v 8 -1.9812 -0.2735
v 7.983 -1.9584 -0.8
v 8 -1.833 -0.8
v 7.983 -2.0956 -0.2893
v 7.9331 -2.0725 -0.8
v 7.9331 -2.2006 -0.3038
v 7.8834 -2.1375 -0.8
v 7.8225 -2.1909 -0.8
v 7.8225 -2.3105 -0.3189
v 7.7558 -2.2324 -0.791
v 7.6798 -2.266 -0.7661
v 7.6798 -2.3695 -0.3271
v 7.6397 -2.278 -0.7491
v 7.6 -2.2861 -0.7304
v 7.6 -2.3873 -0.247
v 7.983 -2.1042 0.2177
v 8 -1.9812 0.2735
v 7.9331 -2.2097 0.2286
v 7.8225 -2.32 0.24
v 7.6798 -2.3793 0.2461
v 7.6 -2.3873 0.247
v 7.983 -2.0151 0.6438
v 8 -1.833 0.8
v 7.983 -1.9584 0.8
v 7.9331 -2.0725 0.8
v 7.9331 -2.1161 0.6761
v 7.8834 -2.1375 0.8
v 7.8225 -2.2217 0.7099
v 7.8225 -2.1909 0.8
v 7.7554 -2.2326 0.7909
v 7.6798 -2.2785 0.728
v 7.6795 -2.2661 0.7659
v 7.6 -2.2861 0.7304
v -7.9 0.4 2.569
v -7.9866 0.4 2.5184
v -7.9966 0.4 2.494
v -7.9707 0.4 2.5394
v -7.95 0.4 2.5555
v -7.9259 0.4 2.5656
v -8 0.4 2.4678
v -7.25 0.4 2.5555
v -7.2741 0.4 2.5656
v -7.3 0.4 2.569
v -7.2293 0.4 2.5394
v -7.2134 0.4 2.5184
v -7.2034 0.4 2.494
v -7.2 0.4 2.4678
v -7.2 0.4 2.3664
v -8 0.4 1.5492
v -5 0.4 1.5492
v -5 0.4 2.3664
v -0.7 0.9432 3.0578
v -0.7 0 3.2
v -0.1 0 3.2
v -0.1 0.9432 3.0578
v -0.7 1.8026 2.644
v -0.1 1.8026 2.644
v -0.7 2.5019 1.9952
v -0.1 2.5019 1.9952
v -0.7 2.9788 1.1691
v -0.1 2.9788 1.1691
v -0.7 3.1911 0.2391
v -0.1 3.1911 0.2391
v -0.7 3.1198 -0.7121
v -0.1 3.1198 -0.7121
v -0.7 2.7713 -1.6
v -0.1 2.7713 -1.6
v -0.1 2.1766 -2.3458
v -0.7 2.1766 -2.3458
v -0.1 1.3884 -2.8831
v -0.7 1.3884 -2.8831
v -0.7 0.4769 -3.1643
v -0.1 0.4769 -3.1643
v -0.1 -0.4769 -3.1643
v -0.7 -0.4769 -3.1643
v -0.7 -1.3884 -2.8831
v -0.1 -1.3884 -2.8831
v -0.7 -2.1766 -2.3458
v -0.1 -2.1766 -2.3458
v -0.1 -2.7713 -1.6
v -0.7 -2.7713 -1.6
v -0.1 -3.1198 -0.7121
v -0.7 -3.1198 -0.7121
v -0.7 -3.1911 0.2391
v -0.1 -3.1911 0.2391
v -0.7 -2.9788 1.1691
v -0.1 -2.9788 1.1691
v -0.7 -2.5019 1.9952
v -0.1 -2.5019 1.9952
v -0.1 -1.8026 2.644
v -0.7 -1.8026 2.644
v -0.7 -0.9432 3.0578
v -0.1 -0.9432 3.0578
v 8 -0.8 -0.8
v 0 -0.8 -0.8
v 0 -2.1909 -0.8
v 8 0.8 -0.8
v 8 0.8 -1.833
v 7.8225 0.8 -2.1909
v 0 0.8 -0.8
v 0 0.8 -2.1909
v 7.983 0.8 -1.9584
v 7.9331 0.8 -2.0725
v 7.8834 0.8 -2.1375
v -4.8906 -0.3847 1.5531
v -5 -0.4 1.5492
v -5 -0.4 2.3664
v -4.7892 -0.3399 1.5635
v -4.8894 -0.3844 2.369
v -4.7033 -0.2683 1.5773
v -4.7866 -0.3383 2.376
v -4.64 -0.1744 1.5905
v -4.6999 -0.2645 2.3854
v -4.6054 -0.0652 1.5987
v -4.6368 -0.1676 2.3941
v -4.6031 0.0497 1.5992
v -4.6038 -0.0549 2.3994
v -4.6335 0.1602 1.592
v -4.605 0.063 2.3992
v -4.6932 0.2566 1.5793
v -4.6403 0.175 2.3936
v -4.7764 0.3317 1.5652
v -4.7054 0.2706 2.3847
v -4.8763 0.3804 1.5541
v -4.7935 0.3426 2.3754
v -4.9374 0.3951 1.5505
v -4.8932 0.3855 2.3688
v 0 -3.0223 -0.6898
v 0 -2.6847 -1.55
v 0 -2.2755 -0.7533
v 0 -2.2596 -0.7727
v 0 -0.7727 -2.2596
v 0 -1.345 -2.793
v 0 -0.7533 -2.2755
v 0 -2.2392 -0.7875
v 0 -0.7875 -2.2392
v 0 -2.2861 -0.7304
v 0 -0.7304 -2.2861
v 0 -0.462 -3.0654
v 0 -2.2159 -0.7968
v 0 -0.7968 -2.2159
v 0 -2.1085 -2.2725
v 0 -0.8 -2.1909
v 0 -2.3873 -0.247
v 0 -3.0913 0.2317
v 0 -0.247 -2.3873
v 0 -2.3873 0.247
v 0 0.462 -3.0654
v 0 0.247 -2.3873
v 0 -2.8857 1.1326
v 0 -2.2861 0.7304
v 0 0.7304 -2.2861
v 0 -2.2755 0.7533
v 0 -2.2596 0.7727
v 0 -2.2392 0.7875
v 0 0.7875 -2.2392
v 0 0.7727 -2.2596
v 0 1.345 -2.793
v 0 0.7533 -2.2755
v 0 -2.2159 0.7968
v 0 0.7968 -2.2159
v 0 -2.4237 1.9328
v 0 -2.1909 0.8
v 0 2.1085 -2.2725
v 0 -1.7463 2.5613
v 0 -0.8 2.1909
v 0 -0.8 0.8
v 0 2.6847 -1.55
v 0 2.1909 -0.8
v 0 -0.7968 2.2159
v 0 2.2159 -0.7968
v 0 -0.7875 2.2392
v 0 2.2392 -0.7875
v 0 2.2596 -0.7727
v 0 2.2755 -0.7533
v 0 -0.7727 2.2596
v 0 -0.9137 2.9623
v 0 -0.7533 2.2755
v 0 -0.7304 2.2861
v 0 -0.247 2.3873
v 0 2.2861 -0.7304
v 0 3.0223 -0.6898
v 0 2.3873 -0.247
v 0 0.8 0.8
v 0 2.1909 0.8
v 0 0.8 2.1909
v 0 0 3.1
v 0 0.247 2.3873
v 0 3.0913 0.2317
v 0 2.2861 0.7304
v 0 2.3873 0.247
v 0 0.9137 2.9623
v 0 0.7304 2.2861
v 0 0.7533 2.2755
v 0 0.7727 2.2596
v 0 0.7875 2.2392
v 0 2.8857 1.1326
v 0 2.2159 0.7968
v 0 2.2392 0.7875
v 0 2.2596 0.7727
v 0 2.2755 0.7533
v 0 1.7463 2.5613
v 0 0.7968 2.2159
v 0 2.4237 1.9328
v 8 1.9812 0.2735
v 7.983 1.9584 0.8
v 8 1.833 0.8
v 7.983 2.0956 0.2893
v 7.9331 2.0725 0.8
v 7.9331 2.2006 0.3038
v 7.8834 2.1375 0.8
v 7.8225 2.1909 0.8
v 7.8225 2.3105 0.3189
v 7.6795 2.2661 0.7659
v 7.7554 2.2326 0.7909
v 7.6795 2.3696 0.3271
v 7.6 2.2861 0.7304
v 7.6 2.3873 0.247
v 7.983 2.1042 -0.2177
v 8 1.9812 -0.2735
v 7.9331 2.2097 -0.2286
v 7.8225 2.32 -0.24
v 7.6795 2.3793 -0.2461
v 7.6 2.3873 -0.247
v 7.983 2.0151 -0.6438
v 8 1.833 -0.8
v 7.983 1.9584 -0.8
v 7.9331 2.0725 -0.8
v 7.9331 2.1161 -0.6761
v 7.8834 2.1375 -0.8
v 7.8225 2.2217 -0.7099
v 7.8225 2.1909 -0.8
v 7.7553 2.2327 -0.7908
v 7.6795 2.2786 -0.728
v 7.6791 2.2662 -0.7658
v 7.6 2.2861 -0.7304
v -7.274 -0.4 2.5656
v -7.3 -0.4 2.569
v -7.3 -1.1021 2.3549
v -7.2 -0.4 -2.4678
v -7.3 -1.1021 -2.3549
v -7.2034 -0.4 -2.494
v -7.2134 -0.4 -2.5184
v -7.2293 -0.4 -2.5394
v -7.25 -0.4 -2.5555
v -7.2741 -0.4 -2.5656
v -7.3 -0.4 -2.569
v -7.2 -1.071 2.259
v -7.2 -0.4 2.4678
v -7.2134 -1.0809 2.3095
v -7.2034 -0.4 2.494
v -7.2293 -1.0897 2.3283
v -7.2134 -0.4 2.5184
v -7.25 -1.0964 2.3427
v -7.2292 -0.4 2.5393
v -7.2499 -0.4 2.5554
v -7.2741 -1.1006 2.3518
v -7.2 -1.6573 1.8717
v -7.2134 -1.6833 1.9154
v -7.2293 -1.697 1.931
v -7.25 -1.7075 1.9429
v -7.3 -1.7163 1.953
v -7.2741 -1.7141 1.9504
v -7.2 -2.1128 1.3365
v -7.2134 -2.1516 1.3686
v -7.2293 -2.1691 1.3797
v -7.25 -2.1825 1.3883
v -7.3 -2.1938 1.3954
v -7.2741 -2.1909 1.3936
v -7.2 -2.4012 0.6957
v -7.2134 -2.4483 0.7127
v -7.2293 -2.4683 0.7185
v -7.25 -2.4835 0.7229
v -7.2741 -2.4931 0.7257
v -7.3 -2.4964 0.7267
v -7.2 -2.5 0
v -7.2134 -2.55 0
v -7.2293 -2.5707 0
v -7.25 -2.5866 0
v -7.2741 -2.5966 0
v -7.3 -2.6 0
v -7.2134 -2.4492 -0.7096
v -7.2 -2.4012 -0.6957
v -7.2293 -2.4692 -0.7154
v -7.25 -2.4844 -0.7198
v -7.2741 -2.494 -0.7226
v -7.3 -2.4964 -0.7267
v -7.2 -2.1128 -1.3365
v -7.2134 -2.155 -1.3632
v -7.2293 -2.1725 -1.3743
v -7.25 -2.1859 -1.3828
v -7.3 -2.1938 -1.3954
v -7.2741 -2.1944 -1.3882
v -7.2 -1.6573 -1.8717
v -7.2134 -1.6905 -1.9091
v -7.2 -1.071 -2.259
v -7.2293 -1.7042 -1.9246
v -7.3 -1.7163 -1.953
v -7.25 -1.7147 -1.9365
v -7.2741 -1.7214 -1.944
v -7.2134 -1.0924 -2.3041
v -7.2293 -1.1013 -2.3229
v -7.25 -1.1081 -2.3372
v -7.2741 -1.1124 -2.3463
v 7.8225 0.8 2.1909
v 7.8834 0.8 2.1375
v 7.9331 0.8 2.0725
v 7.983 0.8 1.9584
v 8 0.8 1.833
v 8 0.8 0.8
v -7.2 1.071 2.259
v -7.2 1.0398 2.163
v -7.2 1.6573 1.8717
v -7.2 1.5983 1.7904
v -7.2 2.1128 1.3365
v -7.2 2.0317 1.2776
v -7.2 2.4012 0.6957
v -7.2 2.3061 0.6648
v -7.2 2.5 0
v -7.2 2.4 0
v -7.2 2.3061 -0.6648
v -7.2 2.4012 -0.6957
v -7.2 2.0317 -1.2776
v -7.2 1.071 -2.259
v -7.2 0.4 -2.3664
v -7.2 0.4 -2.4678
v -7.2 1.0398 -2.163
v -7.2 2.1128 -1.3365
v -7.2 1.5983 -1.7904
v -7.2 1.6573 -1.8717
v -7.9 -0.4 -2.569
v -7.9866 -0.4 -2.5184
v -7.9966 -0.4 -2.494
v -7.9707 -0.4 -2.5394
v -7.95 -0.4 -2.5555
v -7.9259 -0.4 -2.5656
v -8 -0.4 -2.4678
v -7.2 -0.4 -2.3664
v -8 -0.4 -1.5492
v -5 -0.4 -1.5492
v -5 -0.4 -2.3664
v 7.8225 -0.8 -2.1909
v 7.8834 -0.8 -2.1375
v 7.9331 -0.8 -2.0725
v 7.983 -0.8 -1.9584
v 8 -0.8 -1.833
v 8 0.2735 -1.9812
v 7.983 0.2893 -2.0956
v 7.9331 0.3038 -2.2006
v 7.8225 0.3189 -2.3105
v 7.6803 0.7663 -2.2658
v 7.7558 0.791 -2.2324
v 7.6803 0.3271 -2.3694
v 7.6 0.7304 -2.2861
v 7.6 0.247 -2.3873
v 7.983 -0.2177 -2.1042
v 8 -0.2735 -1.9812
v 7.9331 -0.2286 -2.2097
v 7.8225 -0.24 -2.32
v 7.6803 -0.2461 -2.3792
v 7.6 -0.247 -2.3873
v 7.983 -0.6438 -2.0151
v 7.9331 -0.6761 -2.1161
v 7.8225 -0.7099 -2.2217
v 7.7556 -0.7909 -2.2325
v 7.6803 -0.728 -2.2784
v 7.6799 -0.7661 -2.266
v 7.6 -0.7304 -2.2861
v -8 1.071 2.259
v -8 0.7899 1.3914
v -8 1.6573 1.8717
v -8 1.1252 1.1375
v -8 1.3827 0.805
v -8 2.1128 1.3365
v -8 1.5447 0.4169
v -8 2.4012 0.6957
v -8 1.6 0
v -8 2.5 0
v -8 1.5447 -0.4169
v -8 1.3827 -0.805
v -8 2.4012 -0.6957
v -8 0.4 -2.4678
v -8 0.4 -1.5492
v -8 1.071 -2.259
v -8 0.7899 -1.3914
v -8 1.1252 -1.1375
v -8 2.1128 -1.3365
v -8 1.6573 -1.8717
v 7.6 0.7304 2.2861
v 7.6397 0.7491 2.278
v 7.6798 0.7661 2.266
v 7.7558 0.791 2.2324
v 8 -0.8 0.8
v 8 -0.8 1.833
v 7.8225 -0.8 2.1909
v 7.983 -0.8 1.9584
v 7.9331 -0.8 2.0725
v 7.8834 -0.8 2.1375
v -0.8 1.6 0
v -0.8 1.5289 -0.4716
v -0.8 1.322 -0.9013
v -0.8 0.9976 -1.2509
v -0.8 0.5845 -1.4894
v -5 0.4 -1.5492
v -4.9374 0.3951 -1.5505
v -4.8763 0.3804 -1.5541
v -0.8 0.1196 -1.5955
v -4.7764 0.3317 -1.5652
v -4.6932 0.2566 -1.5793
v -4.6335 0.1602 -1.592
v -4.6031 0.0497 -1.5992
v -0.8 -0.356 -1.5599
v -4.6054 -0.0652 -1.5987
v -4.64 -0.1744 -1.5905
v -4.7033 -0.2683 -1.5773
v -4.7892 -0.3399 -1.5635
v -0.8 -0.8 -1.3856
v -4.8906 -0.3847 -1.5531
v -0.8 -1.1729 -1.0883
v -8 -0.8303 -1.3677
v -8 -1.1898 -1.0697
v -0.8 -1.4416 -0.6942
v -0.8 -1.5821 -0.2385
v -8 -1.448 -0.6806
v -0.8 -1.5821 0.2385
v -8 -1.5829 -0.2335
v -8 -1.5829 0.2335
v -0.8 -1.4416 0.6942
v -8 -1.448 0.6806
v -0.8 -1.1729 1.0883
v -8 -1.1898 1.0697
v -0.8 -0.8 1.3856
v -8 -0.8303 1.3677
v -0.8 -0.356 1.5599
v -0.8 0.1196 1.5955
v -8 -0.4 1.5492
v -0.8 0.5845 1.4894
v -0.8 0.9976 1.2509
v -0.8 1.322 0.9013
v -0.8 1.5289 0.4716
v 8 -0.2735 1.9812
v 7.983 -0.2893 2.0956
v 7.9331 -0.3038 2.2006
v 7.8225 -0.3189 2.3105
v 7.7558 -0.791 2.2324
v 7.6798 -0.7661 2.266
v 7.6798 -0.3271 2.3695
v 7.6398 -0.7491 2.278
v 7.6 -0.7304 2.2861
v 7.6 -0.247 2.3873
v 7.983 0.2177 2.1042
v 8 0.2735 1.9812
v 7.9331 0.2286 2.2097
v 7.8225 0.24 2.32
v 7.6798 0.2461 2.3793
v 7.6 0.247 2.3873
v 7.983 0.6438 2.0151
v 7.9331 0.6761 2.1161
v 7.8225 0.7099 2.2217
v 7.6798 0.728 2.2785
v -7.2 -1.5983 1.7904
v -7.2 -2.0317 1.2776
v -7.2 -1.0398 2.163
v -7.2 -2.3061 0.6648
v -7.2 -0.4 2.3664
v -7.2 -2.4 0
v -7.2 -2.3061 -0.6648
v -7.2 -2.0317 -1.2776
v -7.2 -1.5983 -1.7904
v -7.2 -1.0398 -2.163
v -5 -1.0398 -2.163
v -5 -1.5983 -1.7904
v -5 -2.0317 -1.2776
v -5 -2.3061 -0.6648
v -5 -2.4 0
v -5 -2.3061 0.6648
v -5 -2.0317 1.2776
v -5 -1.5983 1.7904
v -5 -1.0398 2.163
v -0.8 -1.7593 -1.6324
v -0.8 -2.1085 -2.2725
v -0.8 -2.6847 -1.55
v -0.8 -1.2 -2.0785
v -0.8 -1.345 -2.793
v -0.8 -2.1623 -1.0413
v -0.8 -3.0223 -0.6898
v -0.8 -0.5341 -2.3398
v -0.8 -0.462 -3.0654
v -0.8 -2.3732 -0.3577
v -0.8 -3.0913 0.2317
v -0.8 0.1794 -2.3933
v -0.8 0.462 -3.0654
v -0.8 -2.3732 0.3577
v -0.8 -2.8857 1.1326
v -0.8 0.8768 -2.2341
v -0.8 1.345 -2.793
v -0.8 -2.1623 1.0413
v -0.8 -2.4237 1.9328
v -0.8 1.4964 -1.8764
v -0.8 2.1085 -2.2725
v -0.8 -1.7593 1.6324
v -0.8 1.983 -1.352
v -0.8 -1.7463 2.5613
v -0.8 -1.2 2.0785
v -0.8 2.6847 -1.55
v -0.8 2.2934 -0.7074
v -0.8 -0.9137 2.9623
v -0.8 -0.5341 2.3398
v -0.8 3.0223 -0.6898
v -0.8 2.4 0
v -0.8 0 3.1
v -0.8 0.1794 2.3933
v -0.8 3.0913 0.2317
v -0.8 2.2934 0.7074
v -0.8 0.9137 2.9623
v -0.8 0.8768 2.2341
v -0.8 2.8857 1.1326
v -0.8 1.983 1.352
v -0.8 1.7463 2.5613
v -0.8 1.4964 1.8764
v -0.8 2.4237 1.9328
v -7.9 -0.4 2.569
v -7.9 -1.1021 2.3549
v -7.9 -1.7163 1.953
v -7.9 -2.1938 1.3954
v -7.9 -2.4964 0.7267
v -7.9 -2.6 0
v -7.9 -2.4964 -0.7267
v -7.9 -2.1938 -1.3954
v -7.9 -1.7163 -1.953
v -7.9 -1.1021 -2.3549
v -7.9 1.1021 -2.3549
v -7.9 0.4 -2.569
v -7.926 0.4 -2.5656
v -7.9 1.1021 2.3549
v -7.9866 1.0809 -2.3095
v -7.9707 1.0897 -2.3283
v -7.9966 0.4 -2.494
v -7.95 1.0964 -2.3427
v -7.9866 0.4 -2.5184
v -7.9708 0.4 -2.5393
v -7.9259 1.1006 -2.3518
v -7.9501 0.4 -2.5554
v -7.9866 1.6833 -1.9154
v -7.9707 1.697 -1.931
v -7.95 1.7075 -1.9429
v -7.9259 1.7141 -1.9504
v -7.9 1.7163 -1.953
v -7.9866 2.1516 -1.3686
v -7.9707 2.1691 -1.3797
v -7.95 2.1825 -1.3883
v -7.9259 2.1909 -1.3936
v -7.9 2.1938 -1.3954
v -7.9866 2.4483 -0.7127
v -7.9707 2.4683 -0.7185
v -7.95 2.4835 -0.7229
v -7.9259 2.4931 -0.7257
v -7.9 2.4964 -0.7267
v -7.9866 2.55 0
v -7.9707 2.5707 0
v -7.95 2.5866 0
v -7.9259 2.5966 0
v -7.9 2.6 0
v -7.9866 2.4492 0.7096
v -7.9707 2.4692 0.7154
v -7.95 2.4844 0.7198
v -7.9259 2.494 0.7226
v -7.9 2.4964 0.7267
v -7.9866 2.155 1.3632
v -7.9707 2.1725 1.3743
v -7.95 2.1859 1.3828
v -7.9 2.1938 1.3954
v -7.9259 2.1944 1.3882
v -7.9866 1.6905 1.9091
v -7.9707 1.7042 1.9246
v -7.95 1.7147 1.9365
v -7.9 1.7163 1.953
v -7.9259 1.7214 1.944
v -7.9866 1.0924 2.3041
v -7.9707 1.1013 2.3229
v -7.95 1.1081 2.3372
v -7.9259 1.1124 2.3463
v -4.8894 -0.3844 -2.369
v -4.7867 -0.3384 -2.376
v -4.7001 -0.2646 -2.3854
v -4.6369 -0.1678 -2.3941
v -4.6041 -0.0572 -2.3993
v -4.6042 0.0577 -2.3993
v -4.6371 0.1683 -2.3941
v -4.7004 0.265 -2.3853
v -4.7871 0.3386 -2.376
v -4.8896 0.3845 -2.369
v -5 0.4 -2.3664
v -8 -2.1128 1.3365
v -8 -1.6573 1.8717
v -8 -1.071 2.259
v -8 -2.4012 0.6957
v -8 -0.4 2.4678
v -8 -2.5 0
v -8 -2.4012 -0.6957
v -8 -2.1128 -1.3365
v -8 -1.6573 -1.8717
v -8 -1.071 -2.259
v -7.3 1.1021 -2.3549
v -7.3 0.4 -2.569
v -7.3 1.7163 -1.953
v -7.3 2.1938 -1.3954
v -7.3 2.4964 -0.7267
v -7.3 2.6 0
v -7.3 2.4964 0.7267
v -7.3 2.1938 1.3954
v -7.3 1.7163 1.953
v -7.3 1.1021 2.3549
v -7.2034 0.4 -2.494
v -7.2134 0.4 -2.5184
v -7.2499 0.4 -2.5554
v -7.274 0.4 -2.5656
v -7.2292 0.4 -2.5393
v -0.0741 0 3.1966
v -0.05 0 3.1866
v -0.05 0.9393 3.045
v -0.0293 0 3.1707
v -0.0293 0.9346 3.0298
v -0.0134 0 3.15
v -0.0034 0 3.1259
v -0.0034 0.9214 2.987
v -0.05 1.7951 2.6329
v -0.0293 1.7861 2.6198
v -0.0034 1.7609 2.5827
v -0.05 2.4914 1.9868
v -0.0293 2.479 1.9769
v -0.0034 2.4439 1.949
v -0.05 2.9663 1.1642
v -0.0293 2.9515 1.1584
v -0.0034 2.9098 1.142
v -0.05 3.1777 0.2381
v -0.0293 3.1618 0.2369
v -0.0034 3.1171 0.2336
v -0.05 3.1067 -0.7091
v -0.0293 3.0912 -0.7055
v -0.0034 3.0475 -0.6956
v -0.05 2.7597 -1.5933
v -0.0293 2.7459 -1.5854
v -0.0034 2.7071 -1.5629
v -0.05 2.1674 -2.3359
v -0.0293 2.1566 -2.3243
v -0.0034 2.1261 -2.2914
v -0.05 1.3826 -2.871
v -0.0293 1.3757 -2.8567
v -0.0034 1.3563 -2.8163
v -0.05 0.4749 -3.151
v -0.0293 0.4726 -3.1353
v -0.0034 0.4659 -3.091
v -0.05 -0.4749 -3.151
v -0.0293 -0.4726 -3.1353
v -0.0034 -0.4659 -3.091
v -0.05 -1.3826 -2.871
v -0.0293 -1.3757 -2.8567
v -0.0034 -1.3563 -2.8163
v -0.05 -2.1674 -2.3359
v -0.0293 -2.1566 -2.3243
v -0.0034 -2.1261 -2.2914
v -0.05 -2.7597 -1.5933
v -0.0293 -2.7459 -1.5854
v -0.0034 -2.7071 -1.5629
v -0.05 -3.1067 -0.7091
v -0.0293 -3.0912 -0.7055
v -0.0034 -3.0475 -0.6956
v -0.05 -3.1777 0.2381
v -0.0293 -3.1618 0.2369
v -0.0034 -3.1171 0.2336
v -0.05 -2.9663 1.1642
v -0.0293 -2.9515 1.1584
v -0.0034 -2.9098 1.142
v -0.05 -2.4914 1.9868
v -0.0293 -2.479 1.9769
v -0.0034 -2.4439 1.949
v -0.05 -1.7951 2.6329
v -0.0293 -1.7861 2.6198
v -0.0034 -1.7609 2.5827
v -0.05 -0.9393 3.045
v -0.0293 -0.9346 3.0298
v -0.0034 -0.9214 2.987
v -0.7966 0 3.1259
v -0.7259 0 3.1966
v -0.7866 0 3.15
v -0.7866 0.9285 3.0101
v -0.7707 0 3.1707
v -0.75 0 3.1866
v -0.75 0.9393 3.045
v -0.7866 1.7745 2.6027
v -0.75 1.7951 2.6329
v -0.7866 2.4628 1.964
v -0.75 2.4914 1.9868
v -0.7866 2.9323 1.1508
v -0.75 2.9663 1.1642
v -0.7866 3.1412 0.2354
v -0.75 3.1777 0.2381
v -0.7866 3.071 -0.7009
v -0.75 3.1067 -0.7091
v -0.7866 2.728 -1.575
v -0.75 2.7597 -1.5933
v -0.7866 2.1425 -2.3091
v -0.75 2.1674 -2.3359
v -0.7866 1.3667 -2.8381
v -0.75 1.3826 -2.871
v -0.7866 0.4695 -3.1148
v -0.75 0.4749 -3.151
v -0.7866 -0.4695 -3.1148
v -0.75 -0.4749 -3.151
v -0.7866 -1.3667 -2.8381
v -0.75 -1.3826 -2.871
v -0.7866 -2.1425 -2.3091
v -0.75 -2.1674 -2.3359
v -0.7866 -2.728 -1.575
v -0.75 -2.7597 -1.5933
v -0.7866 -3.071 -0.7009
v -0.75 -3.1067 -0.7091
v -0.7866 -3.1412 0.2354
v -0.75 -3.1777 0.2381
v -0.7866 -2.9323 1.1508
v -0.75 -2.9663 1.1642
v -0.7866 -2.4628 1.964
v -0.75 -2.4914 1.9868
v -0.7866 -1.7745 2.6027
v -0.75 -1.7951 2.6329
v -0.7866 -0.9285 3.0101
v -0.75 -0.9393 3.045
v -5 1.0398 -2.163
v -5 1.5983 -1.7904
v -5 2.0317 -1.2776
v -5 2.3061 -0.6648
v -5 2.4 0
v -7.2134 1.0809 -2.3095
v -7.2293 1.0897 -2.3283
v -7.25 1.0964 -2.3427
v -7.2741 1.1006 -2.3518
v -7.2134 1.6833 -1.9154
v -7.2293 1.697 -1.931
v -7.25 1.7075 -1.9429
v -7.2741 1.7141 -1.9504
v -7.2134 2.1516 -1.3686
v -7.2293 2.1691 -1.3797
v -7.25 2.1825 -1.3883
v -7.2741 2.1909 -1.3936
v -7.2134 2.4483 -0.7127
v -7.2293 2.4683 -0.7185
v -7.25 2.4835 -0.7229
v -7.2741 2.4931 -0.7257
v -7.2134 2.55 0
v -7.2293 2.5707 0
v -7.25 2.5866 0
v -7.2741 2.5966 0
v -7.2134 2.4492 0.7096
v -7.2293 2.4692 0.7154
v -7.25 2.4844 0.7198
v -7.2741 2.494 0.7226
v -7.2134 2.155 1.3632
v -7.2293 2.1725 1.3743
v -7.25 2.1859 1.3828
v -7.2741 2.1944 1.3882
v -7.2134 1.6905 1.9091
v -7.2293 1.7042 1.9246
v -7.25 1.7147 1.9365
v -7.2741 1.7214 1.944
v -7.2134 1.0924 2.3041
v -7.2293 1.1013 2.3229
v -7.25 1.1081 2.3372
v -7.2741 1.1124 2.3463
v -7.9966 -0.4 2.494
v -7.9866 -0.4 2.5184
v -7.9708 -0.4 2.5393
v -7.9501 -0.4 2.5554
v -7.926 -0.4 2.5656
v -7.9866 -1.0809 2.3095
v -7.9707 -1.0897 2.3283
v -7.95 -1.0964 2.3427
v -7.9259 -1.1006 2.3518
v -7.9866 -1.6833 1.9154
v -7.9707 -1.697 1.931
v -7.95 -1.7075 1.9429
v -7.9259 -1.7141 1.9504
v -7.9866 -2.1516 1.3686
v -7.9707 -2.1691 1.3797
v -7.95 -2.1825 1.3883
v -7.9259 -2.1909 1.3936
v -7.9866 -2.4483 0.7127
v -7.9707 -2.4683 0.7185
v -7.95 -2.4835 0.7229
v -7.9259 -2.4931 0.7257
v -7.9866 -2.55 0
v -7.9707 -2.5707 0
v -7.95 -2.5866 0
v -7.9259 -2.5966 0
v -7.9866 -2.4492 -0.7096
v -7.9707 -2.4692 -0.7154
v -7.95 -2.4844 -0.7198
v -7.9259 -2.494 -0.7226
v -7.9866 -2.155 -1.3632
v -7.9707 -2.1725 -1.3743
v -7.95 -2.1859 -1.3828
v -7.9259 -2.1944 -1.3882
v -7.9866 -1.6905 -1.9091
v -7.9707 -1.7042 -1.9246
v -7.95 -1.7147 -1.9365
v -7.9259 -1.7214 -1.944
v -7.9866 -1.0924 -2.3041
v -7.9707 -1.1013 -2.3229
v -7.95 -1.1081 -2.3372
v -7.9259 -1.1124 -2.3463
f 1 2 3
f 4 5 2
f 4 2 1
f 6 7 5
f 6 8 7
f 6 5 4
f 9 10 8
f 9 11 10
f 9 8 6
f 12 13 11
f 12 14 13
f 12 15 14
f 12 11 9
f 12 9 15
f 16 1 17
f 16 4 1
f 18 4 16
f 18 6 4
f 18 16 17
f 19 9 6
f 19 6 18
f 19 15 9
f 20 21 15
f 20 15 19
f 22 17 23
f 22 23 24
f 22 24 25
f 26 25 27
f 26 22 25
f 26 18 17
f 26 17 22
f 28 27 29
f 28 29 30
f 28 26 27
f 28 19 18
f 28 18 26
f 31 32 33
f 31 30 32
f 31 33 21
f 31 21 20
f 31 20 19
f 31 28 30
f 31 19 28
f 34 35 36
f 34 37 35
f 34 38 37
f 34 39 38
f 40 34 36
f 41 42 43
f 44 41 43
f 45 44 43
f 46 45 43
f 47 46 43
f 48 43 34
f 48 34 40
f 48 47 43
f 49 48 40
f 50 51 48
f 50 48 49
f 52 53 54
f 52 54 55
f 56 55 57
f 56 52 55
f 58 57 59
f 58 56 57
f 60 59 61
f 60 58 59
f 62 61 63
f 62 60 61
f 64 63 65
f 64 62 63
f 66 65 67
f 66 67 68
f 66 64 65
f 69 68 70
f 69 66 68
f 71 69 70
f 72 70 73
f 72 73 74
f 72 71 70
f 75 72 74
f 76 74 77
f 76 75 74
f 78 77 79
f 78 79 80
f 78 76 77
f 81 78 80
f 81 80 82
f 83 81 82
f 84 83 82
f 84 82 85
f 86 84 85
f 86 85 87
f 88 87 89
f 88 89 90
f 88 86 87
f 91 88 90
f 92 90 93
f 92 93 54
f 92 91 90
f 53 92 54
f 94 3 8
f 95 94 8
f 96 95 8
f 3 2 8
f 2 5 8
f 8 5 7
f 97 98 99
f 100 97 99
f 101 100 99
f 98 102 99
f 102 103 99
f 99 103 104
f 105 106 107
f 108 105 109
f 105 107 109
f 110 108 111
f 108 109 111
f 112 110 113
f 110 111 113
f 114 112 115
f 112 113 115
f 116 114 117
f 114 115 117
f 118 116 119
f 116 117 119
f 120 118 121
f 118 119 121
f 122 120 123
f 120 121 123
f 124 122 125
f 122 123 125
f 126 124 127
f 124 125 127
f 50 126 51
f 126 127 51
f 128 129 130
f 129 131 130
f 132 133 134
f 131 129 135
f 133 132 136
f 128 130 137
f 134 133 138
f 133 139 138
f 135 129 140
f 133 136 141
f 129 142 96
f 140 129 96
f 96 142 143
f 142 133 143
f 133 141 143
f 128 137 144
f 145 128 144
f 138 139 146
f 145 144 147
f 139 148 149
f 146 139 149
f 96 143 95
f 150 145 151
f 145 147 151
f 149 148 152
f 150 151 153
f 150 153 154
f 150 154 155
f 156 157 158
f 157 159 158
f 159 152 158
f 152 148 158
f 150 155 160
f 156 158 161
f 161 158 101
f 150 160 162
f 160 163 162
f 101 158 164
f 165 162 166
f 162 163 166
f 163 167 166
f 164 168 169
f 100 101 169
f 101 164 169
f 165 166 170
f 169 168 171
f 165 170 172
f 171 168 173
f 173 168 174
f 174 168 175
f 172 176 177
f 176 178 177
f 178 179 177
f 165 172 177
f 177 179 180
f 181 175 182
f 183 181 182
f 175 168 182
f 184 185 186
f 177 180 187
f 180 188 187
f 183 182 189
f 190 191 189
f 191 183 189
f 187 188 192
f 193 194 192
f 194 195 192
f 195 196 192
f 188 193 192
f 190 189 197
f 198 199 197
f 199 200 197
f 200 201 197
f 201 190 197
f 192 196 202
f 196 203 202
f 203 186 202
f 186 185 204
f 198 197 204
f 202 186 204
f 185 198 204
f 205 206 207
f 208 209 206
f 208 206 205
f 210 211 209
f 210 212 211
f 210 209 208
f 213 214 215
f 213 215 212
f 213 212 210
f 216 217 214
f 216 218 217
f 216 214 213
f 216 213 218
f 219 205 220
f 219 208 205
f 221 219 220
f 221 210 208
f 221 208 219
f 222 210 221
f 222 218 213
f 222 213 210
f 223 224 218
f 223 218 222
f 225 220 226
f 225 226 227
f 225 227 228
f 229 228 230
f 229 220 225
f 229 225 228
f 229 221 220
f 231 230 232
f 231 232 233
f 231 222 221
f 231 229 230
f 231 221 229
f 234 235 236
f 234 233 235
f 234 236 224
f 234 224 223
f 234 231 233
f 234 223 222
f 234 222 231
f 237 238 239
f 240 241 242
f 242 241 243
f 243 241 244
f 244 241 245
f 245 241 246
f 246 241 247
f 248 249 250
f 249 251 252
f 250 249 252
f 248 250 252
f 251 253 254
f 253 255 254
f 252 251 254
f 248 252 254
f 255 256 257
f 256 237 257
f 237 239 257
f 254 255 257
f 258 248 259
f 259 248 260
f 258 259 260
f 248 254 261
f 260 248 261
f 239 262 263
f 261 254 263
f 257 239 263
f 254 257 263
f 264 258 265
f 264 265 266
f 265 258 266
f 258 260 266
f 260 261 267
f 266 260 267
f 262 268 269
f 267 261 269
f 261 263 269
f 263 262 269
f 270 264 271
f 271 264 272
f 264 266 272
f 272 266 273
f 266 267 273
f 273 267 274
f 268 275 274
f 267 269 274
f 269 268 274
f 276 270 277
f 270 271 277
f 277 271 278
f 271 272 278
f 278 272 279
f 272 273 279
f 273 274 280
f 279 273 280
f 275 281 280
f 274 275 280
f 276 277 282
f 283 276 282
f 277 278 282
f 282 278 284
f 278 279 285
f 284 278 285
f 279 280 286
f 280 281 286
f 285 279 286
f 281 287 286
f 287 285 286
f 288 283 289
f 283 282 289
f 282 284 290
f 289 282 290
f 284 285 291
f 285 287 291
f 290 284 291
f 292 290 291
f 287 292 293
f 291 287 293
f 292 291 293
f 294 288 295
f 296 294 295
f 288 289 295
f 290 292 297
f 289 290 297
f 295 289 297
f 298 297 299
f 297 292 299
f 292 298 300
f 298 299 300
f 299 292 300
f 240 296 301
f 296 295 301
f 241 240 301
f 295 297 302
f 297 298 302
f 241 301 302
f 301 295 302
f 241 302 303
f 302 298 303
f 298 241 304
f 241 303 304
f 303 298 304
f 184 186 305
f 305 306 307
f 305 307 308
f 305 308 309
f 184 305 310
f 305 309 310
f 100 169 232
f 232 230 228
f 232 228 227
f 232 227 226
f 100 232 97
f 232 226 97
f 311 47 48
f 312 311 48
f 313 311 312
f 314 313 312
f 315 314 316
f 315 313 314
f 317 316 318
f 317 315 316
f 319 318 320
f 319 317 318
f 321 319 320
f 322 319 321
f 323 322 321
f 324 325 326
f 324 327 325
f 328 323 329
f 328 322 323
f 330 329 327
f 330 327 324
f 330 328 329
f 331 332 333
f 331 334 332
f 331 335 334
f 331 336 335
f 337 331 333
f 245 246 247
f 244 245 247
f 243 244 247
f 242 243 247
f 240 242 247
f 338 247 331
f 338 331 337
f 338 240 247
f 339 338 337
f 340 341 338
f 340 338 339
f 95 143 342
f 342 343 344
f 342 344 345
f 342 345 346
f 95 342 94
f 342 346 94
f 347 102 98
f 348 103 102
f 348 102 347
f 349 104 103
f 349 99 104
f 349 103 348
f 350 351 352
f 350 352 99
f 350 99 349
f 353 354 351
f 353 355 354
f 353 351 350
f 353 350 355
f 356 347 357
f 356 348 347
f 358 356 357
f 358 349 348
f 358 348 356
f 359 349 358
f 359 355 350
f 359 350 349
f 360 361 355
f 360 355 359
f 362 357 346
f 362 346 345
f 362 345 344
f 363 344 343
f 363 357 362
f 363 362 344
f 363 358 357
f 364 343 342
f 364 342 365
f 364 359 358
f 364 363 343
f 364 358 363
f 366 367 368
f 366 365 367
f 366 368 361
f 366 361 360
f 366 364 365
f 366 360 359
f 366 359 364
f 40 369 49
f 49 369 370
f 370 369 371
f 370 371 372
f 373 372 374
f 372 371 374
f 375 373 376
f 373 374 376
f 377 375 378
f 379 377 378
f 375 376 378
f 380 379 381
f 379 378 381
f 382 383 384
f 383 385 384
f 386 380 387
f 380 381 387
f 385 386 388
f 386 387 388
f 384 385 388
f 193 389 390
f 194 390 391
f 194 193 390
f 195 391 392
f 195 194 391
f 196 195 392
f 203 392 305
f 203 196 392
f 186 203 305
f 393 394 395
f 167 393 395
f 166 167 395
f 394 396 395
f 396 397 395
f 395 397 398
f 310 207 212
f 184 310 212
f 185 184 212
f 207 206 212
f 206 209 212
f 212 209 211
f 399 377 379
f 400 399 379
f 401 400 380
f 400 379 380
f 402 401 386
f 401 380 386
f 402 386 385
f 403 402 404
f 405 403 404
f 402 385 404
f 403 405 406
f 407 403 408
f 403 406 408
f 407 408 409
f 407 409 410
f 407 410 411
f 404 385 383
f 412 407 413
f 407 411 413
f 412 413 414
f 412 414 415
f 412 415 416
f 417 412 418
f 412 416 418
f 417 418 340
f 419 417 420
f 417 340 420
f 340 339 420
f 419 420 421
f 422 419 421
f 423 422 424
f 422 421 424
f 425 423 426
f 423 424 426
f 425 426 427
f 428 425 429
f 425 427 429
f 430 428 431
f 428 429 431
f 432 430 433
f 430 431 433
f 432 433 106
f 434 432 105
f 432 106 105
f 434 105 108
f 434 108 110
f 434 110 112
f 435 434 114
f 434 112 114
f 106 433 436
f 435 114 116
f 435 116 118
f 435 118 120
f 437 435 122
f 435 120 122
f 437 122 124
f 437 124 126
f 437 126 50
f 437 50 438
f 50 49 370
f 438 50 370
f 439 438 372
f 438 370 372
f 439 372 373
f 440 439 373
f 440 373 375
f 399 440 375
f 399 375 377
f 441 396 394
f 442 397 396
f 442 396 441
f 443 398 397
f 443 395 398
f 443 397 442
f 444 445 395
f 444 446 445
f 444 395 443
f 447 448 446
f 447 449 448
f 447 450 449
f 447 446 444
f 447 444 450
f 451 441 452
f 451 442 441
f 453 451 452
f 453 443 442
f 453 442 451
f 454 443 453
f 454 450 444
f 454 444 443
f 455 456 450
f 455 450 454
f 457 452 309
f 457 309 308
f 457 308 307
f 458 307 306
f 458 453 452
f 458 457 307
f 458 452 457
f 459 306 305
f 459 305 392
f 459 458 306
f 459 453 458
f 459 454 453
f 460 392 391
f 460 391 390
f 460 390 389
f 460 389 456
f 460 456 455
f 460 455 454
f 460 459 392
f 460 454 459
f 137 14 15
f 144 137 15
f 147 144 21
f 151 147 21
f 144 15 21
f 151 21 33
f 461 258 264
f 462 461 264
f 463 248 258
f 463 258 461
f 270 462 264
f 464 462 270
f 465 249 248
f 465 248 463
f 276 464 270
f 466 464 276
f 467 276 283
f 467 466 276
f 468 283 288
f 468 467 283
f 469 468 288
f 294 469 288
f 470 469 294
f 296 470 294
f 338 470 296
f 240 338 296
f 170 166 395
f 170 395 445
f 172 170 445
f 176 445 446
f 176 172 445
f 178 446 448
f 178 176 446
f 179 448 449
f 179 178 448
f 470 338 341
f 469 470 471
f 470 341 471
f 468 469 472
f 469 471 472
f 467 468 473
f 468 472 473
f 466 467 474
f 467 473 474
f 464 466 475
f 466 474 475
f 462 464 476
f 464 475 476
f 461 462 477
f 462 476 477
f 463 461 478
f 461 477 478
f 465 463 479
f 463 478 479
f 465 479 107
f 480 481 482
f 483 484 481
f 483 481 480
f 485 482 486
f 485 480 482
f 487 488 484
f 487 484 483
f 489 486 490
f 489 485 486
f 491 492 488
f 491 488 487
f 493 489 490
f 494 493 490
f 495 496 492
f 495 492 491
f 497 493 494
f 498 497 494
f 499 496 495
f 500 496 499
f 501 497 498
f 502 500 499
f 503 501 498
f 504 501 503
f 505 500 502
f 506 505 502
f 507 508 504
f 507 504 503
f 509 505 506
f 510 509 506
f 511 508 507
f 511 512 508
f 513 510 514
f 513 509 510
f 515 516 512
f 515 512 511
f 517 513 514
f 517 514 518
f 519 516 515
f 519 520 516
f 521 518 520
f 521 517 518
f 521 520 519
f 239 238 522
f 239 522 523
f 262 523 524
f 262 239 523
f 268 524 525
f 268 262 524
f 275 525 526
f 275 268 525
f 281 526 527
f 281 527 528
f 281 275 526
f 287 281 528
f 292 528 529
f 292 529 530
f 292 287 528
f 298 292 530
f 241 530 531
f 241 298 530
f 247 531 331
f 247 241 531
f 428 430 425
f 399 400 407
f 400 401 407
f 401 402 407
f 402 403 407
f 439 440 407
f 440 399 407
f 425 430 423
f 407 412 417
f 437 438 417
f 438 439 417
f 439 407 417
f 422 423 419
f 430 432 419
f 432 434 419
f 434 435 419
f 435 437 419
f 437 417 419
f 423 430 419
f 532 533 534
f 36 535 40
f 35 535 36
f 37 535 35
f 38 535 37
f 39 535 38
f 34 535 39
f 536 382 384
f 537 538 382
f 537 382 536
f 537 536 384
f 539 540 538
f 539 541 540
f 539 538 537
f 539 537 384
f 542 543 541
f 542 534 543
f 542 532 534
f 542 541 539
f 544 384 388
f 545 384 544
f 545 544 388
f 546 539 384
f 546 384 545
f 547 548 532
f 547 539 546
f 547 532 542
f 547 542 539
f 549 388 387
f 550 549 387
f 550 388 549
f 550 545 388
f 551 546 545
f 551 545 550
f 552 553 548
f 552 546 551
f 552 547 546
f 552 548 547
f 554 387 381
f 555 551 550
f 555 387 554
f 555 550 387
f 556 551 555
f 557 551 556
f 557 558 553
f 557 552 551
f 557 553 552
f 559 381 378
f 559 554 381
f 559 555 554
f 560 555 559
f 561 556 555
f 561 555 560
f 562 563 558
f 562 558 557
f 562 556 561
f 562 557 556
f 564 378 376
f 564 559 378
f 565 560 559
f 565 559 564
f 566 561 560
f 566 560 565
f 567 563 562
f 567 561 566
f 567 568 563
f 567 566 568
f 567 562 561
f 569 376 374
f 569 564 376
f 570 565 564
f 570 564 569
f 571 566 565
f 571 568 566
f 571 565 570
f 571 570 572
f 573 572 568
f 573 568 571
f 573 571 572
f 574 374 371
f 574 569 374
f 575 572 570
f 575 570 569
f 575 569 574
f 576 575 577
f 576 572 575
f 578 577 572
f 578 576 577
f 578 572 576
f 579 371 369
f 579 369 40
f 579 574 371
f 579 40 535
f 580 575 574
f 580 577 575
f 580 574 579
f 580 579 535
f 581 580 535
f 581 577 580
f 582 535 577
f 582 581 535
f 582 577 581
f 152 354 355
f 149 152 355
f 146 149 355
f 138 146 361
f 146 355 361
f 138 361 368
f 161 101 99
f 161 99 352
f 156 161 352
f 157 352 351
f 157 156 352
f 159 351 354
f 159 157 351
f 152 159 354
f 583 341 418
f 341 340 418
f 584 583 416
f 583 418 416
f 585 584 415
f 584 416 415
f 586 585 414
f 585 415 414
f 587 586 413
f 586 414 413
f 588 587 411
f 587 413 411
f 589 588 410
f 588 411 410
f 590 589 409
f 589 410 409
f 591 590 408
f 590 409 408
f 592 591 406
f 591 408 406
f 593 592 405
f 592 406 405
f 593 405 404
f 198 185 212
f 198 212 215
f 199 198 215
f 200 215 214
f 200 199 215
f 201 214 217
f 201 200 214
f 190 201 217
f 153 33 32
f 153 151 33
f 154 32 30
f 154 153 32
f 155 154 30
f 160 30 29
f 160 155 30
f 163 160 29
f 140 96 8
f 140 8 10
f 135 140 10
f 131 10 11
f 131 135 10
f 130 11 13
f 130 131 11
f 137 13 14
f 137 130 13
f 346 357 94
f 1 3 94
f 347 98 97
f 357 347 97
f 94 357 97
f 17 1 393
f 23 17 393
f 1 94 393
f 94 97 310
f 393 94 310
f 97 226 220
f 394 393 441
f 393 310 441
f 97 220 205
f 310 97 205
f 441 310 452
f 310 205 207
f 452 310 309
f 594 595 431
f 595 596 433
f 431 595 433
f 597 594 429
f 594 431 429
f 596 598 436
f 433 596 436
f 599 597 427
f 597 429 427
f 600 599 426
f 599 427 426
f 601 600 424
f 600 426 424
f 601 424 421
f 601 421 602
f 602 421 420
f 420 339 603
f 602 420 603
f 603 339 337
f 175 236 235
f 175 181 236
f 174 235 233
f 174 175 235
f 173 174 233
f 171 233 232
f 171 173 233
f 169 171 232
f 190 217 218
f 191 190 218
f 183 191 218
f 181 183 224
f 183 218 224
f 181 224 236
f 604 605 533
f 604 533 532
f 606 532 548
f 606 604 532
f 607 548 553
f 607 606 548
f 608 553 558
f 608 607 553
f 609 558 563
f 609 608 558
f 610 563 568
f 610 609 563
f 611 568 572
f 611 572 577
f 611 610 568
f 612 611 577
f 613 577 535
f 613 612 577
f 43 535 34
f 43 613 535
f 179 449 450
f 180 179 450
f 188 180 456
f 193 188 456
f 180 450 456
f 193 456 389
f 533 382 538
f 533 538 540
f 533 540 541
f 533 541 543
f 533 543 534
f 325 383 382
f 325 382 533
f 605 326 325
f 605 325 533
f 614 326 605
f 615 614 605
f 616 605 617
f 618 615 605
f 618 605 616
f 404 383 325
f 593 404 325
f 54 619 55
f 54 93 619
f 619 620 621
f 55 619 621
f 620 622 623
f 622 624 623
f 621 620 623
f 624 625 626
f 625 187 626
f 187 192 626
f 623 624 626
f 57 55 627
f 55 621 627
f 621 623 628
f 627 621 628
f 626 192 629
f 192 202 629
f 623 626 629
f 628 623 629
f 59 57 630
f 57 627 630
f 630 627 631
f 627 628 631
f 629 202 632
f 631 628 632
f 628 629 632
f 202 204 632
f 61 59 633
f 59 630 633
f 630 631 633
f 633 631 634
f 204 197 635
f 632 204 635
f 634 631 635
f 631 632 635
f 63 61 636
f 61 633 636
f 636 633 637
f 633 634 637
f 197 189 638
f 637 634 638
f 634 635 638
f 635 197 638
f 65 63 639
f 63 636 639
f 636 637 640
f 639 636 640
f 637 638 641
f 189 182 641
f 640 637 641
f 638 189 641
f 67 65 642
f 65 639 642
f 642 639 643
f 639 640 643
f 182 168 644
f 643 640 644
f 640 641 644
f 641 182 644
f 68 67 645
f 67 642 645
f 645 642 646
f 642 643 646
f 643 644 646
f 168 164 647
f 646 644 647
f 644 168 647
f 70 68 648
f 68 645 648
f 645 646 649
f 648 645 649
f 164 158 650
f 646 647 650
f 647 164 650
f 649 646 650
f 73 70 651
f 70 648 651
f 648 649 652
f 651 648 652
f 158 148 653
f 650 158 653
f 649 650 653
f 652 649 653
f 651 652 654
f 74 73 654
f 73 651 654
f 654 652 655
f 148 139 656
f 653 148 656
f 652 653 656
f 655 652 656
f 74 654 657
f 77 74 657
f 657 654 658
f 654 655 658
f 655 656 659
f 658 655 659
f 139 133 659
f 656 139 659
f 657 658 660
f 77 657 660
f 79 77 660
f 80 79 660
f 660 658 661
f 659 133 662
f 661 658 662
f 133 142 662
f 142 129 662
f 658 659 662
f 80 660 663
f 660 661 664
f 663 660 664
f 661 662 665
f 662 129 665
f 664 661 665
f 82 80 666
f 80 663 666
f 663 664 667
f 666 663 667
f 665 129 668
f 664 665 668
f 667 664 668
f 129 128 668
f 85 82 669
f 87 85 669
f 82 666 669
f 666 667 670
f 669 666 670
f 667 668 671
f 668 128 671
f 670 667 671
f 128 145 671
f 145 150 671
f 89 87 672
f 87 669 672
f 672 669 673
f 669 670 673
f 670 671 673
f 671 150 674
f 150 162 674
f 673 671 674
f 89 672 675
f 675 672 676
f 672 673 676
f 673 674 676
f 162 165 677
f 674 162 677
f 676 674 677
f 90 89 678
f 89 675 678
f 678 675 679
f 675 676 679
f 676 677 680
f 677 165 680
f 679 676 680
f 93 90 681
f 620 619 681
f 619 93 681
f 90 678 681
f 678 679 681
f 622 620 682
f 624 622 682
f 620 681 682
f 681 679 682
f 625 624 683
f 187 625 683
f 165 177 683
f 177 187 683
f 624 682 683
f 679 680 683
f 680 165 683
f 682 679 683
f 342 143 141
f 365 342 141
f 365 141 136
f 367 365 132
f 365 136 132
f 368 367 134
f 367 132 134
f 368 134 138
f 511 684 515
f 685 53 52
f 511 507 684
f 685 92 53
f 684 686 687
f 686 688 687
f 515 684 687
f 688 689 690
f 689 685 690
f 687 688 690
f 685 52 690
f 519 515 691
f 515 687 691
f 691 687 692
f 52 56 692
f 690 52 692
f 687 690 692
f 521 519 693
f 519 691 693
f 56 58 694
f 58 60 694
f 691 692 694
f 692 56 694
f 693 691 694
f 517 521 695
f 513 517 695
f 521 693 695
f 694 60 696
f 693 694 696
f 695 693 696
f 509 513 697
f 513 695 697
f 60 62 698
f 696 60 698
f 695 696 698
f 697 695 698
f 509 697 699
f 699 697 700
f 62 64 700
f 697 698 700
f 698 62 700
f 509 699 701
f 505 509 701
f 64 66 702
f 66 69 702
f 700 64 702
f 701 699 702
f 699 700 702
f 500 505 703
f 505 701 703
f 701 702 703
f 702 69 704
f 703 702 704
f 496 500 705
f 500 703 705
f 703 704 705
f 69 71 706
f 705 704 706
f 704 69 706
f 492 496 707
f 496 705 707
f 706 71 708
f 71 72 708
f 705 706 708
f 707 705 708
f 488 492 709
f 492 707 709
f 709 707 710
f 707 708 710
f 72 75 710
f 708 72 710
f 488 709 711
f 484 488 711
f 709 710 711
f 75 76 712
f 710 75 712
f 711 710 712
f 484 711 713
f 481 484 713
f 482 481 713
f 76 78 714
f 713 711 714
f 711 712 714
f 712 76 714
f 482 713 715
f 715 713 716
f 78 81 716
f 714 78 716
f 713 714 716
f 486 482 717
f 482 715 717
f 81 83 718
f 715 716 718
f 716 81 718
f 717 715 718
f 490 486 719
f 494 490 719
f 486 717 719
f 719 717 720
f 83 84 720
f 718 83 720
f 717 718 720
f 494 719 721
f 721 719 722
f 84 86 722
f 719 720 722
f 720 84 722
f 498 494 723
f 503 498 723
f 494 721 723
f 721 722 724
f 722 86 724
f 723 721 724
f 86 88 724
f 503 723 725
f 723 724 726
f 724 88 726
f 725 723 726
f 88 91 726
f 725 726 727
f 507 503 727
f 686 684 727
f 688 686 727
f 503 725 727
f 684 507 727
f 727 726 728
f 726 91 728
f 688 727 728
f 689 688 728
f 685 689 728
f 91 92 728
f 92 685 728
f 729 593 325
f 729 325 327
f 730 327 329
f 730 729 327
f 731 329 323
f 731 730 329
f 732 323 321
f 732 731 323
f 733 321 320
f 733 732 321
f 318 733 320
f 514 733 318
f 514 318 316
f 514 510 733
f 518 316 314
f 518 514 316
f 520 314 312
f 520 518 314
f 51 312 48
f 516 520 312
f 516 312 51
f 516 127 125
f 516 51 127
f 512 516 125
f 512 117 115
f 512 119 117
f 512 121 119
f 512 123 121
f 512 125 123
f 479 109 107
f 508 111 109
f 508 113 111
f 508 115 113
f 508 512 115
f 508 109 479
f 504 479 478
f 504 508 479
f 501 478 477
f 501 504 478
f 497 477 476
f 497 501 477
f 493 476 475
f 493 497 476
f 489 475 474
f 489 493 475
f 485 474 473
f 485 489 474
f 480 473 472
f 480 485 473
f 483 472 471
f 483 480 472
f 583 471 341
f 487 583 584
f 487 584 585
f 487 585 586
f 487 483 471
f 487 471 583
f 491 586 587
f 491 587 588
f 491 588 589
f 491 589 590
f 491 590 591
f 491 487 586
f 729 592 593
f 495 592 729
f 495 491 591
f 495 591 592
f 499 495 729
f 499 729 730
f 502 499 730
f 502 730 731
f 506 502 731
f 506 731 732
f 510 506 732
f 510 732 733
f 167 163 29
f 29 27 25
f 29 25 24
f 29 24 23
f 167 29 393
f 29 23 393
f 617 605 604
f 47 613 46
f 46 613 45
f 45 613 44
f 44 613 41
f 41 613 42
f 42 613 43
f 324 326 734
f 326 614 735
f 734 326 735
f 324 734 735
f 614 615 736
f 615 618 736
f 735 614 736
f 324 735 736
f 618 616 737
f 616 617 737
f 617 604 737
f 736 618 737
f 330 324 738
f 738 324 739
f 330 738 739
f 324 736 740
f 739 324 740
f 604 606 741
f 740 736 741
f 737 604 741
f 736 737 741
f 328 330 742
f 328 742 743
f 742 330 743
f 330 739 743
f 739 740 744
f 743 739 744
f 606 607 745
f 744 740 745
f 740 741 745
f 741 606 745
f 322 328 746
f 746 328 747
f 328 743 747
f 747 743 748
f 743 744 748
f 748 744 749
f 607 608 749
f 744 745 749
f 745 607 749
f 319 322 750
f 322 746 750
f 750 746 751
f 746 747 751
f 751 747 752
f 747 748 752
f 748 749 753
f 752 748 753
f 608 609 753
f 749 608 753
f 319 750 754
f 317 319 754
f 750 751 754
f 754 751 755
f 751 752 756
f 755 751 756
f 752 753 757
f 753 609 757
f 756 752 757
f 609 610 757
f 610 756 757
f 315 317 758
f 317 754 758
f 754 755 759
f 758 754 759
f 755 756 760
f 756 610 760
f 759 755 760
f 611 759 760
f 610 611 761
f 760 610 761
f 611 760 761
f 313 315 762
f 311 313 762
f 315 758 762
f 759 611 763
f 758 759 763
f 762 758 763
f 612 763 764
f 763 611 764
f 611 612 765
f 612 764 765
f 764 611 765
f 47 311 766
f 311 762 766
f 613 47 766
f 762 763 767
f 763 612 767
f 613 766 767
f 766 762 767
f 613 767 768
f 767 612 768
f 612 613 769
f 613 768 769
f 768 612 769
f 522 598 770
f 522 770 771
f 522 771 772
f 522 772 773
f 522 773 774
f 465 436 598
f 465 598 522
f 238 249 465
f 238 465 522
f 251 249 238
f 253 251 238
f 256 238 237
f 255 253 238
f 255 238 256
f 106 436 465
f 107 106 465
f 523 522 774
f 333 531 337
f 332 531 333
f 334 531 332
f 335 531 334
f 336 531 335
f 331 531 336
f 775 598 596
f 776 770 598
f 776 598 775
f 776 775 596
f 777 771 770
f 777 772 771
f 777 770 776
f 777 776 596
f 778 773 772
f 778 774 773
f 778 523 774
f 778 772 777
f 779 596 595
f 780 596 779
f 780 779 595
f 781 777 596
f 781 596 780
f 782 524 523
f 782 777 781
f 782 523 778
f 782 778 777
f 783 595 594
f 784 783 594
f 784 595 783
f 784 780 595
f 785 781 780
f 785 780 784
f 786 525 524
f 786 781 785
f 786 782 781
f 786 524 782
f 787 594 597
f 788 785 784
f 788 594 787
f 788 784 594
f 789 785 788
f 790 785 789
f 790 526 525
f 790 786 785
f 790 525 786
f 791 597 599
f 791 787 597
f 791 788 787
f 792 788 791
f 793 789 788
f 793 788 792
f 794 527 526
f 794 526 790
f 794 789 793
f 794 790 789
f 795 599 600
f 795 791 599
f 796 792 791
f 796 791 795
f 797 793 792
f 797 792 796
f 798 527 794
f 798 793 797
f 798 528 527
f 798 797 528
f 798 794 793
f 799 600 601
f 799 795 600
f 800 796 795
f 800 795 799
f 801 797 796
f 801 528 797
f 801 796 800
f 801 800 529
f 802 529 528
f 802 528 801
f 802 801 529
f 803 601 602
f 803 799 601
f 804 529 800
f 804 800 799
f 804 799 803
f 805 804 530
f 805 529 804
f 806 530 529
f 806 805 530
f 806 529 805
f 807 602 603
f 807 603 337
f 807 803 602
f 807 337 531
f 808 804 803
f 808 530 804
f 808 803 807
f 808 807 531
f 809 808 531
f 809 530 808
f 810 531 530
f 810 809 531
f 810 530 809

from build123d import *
from build123d.topology import SkipClean

# Parameters (mm, degrees)
SKETCH1_W                  = 4.2
SKETCH1_H                  = 2.4
F_0_8_0_8_DIAMETER_HOLE1_D = 0.8
SKETCH6_R                  = 3.2
BOSS_EXTRUDE1_DEPTH        = 0.8
BOSS_EXTRUDE2_DEPTH        = 3
CUT_EXTRUDE1_DEPTH         = 2.2
BOSS_EXTRUDE3_DEPTH        = 2.2
BOSS_EXTRUDE4_DEPTH        = 0.8
BOSS_EXTRUDE5_START        = 8
BOSS_EXTRUDE5_DEPTH        = 8
SKETCH16_W                 = 7.2
SKETCH16_H                 = 1.6
FILLET1_R                  = 0.1
FILLET2_R                  = 0.4


with BuildPart() as part:
    # Sketch1 → Revolve1 (revolve)
    with BuildSketch(Plane.XY):
        with Locations((-2.9, 1.2)):
            Rectangle(SKETCH1_W, SKETCH1_H)
    revolve(axis=Axis((-5, 0, 0), (1, 0, 0)))

    # Ø0.8 (0.8) Diameter Hole1 (through all)
    with Locations(Plane(origin=(-5, 0, -2.4), x_dir=(0, -1, 0), z_dir=(0, 0, -1))):
        with Locations((0, 0)):
            Hole(F_0_8_0_8_DIAMETER_HOLE1_D / 2)

    # Sketch6 → Boss-Extrude1 (add)
    with BuildSketch(Plane.ZY.offset(0.8)):
        Circle(SKETCH6_R)
    extrude(amount=-BOSS_EXTRUDE1_DEPTH)

    # Sketch7 → Boss-Extrude2 (add)
    with BuildSketch(Plane.ZY.offset(5)):
        with BuildLine():
            Line((-2.569046516, -0.4), (2.569046516, -0.4))
            ThreePointArc((2.569046516, -0.4), (0, -2.6), (-2.569046516, -0.4))
        make_face()
    extrude(amount=BOSS_EXTRUDE2_DEPTH)

    # Sketch8 → Cut-Extrude1 (cut)
    with SkipClean():  # the faces are left unmerged after this step: merging them gives an invalid solid
        with BuildSketch(Plane(origin=(-5, 0, 0), x_dir=(0, 0, -1), z_dir=(1, 0, 0))):
            with BuildLine():
                Line((2.569046516, -0.4), (2.366431913, -0.4))
                ThreePointArc((2.366431913, -0.4), (0, -2.4), (-2.366431913, -0.4))
                Line((-2.366431913, -0.4), (-2.569046516, -0.4))
                ThreePointArc((-2.569046516, -0.4), (0, -2.6), (2.569046516, -0.4))
            make_face()
        extrude(amount=-CUT_EXTRUDE1_DEPTH, mode=Mode.SUBTRACT)

    # Sketch9 → Boss-Extrude3 (add)
    with SkipClean():  # the faces are left unmerged after this step: merging them gives an invalid solid
        with BuildSketch(Plane.ZY.offset(5)):
            with BuildLine():
                Line((2.366431913, 0.4), (-2.366431913, 0.4))
                ThreePointArc((-2.366431913, 0.4), (0, 2.4), (2.366431913, 0.4))
            make_face()
        extrude(amount=BOSS_EXTRUDE3_DEPTH)

    # Sketch10 → Boss-Extrude4 (add)
    with SkipClean():  # the faces are left unmerged after this step: merging them gives an invalid solid
        with BuildSketch(Plane.ZY.offset(7.2)):
            with BuildLine():
                Line((2.569046516, 0.4), (-2.569046516, 0.4))
                ThreePointArc((-2.569046516, 0.4), (0, 2.6), (2.569046516, 0.4))
            make_face()
        extrude(amount=BOSS_EXTRUDE4_DEPTH)

    # Sketch11 → Boss-Extrude5 (add)
    with SkipClean():  # the faces are left unmerged after this step: merging them gives an invalid solid
        with BuildSketch(Plane(origin=(0, 0, 0), x_dir=(0, 0, -1), z_dir=(1, 0, 0)).offset(BOSS_EXTRUDE5_START)):
            with BuildLine():
                Line((2.2627417, -0.8), (0.8, -0.8))
                Line((0.8, -0.8), (0.8, -2.2627417))
                ThreePointArc((0.8, -2.2627417), (0, -2.4), (-0.8, -2.2627417))
                Line((-0.8, -2.2627417), (-0.8, -0.8))
                Line((-0.8, -0.8), (-2.2627417, -0.8))
                ThreePointArc((-2.2627417, -0.8), (-2.4, 0), (-2.2627417, 0.8))
                Line((-2.2627417, 0.8), (-0.8, 0.8))
                Line((-0.8, 0.8), (-0.8, 2.2627417))
                ThreePointArc((-0.8, 2.2627417), (0, 2.4), (0.8, 2.2627417))
                Line((0.8, 2.2627417), (0.8, 0.8))
                Line((0.8, 0.8), (2.2627417, 0.8))
                ThreePointArc((2.2627417, 0.8), (2.4, 0), (2.2627417, -0.8))
            make_face()
        extrude(amount=-BOSS_EXTRUDE5_DEPTH)

    # Sketch16 → Cut-Revolve1 (revolve, cut)
    with SkipClean():  # the faces are left unmerged after this step: merging them gives an invalid solid
        with BuildSketch(Plane(origin=(0, 0, 0), x_dir=(-1, 0, 0), z_dir=(0, 0, -1))):
            with Locations((4.4, 0.8)):
                Rectangle(SKETCH16_W, SKETCH16_H)
        revolve(axis=Axis((-0.8, 0, 0), (-1, 0, 0)), mode=Mode.SUBTRACT)

    # Fillet1
    fillet1_edges = [part.edges().sort_by_distance(p)[0] for p in [
        (0, 0, -3.2),
        (-0.8, 0, -3.2),
        (-8, -2.6, 0),
        (-7.2, -2.6, 0),
        (-7.2, 2.6, 0),
        (-8, 2.6, 0),
        (4, -0.8, -2.2627417),
        (4, 0.8, -2.2627417),
        (4, 2.2627417, -0.8),
        (4, 2.2627417, 0.8),
        (4, 0.8, 2.2627417),
        (4, -0.8, 2.2627417),
        (4, -2.2627417, 0.8),
        (4, -2.2627417, -0.8),
    ]]
    fillet(fillet1_edges, radius=FILLET1_R)

    # Fillet2
    # the kernel refuses this fillet: 0.4 mm, written as the material it takes off along each edge
    with BuildSketch(Plane(origin=(8, 0, 0), x_dir=(0, -0.6638434598853418, 0.7478715536557455), z_dir=(0, -0.7478715536557455, -0.6638434598853418))) as fillet2_piece_1:
        with BuildLine():
            CenterArc((2.4 - FILLET2_R, FILLET2_R), FILLET2_R, 270, 90)
            Line((2.4 - FILLET2_R, 0), (2.4, 0))
            Line((2.4, 0), (2.4, FILLET2_R))
        make_face()
    revolve(axis=Axis((8, 0, 0), (-1, 0, 0)), revolution_arc=83.187319702, mode=Mode.SUBTRACT)
    with BuildSketch(Plane(origin=(8, 0, 0), x_dir=(0, -0.7478715536557221, -0.6638434598853682), z_dir=(0, 0.6638434598853682, -0.7478715536557221))) as fillet2_piece_2:
        with BuildLine():
            CenterArc((2.4 - FILLET2_R, FILLET2_R), FILLET2_R, 270, 90)
            Line((2.4 - FILLET2_R, 0), (2.4, 0))
            Line((2.4, 0), (2.4, FILLET2_R))
        make_face()
    revolve(axis=Axis((8, 0, 0), (-1, 0, 0)), revolution_arc=83.187319702, mode=Mode.SUBTRACT)
    with BuildSketch(Plane(origin=(8, 0, 0), x_dir=(0, 0.7478715536557219, 0.6638434598853683), z_dir=(0, -0.6638434598853683, 0.7478715536557219))) as fillet2_piece_3:
        with BuildLine():
            CenterArc((2.4 - FILLET2_R, FILLET2_R), FILLET2_R, 270, 90)
            Line((2.4 - FILLET2_R, 0), (2.4, 0))
            Line((2.4, 0), (2.4, FILLET2_R))
        make_face()
    revolve(axis=Axis((8, 0, 0), (-1, 0, 0)), revolution_arc=83.187319702, mode=Mode.SUBTRACT)
    with BuildSketch(Plane(origin=(8, 0, 0), x_dir=(0, 0.6638434598852943, -0.7478715536557876), z_dir=(0, 0.7478715536557876, 0.6638434598852943))) as fillet2_piece_4:
        with BuildLine():
            CenterArc((2.4 - FILLET2_R, FILLET2_R), FILLET2_R, 270, 90)
            Line((2.4 - FILLET2_R, 0), (2.4, 0))
            Line((2.4, 0), (2.4, FILLET2_R))
        make_face()
    revolve(axis=Axis((8, 0, 0), (-1, 0, 0)), revolution_arc=83.187319702, mode=Mode.SUBTRACT)


solid = part.part
